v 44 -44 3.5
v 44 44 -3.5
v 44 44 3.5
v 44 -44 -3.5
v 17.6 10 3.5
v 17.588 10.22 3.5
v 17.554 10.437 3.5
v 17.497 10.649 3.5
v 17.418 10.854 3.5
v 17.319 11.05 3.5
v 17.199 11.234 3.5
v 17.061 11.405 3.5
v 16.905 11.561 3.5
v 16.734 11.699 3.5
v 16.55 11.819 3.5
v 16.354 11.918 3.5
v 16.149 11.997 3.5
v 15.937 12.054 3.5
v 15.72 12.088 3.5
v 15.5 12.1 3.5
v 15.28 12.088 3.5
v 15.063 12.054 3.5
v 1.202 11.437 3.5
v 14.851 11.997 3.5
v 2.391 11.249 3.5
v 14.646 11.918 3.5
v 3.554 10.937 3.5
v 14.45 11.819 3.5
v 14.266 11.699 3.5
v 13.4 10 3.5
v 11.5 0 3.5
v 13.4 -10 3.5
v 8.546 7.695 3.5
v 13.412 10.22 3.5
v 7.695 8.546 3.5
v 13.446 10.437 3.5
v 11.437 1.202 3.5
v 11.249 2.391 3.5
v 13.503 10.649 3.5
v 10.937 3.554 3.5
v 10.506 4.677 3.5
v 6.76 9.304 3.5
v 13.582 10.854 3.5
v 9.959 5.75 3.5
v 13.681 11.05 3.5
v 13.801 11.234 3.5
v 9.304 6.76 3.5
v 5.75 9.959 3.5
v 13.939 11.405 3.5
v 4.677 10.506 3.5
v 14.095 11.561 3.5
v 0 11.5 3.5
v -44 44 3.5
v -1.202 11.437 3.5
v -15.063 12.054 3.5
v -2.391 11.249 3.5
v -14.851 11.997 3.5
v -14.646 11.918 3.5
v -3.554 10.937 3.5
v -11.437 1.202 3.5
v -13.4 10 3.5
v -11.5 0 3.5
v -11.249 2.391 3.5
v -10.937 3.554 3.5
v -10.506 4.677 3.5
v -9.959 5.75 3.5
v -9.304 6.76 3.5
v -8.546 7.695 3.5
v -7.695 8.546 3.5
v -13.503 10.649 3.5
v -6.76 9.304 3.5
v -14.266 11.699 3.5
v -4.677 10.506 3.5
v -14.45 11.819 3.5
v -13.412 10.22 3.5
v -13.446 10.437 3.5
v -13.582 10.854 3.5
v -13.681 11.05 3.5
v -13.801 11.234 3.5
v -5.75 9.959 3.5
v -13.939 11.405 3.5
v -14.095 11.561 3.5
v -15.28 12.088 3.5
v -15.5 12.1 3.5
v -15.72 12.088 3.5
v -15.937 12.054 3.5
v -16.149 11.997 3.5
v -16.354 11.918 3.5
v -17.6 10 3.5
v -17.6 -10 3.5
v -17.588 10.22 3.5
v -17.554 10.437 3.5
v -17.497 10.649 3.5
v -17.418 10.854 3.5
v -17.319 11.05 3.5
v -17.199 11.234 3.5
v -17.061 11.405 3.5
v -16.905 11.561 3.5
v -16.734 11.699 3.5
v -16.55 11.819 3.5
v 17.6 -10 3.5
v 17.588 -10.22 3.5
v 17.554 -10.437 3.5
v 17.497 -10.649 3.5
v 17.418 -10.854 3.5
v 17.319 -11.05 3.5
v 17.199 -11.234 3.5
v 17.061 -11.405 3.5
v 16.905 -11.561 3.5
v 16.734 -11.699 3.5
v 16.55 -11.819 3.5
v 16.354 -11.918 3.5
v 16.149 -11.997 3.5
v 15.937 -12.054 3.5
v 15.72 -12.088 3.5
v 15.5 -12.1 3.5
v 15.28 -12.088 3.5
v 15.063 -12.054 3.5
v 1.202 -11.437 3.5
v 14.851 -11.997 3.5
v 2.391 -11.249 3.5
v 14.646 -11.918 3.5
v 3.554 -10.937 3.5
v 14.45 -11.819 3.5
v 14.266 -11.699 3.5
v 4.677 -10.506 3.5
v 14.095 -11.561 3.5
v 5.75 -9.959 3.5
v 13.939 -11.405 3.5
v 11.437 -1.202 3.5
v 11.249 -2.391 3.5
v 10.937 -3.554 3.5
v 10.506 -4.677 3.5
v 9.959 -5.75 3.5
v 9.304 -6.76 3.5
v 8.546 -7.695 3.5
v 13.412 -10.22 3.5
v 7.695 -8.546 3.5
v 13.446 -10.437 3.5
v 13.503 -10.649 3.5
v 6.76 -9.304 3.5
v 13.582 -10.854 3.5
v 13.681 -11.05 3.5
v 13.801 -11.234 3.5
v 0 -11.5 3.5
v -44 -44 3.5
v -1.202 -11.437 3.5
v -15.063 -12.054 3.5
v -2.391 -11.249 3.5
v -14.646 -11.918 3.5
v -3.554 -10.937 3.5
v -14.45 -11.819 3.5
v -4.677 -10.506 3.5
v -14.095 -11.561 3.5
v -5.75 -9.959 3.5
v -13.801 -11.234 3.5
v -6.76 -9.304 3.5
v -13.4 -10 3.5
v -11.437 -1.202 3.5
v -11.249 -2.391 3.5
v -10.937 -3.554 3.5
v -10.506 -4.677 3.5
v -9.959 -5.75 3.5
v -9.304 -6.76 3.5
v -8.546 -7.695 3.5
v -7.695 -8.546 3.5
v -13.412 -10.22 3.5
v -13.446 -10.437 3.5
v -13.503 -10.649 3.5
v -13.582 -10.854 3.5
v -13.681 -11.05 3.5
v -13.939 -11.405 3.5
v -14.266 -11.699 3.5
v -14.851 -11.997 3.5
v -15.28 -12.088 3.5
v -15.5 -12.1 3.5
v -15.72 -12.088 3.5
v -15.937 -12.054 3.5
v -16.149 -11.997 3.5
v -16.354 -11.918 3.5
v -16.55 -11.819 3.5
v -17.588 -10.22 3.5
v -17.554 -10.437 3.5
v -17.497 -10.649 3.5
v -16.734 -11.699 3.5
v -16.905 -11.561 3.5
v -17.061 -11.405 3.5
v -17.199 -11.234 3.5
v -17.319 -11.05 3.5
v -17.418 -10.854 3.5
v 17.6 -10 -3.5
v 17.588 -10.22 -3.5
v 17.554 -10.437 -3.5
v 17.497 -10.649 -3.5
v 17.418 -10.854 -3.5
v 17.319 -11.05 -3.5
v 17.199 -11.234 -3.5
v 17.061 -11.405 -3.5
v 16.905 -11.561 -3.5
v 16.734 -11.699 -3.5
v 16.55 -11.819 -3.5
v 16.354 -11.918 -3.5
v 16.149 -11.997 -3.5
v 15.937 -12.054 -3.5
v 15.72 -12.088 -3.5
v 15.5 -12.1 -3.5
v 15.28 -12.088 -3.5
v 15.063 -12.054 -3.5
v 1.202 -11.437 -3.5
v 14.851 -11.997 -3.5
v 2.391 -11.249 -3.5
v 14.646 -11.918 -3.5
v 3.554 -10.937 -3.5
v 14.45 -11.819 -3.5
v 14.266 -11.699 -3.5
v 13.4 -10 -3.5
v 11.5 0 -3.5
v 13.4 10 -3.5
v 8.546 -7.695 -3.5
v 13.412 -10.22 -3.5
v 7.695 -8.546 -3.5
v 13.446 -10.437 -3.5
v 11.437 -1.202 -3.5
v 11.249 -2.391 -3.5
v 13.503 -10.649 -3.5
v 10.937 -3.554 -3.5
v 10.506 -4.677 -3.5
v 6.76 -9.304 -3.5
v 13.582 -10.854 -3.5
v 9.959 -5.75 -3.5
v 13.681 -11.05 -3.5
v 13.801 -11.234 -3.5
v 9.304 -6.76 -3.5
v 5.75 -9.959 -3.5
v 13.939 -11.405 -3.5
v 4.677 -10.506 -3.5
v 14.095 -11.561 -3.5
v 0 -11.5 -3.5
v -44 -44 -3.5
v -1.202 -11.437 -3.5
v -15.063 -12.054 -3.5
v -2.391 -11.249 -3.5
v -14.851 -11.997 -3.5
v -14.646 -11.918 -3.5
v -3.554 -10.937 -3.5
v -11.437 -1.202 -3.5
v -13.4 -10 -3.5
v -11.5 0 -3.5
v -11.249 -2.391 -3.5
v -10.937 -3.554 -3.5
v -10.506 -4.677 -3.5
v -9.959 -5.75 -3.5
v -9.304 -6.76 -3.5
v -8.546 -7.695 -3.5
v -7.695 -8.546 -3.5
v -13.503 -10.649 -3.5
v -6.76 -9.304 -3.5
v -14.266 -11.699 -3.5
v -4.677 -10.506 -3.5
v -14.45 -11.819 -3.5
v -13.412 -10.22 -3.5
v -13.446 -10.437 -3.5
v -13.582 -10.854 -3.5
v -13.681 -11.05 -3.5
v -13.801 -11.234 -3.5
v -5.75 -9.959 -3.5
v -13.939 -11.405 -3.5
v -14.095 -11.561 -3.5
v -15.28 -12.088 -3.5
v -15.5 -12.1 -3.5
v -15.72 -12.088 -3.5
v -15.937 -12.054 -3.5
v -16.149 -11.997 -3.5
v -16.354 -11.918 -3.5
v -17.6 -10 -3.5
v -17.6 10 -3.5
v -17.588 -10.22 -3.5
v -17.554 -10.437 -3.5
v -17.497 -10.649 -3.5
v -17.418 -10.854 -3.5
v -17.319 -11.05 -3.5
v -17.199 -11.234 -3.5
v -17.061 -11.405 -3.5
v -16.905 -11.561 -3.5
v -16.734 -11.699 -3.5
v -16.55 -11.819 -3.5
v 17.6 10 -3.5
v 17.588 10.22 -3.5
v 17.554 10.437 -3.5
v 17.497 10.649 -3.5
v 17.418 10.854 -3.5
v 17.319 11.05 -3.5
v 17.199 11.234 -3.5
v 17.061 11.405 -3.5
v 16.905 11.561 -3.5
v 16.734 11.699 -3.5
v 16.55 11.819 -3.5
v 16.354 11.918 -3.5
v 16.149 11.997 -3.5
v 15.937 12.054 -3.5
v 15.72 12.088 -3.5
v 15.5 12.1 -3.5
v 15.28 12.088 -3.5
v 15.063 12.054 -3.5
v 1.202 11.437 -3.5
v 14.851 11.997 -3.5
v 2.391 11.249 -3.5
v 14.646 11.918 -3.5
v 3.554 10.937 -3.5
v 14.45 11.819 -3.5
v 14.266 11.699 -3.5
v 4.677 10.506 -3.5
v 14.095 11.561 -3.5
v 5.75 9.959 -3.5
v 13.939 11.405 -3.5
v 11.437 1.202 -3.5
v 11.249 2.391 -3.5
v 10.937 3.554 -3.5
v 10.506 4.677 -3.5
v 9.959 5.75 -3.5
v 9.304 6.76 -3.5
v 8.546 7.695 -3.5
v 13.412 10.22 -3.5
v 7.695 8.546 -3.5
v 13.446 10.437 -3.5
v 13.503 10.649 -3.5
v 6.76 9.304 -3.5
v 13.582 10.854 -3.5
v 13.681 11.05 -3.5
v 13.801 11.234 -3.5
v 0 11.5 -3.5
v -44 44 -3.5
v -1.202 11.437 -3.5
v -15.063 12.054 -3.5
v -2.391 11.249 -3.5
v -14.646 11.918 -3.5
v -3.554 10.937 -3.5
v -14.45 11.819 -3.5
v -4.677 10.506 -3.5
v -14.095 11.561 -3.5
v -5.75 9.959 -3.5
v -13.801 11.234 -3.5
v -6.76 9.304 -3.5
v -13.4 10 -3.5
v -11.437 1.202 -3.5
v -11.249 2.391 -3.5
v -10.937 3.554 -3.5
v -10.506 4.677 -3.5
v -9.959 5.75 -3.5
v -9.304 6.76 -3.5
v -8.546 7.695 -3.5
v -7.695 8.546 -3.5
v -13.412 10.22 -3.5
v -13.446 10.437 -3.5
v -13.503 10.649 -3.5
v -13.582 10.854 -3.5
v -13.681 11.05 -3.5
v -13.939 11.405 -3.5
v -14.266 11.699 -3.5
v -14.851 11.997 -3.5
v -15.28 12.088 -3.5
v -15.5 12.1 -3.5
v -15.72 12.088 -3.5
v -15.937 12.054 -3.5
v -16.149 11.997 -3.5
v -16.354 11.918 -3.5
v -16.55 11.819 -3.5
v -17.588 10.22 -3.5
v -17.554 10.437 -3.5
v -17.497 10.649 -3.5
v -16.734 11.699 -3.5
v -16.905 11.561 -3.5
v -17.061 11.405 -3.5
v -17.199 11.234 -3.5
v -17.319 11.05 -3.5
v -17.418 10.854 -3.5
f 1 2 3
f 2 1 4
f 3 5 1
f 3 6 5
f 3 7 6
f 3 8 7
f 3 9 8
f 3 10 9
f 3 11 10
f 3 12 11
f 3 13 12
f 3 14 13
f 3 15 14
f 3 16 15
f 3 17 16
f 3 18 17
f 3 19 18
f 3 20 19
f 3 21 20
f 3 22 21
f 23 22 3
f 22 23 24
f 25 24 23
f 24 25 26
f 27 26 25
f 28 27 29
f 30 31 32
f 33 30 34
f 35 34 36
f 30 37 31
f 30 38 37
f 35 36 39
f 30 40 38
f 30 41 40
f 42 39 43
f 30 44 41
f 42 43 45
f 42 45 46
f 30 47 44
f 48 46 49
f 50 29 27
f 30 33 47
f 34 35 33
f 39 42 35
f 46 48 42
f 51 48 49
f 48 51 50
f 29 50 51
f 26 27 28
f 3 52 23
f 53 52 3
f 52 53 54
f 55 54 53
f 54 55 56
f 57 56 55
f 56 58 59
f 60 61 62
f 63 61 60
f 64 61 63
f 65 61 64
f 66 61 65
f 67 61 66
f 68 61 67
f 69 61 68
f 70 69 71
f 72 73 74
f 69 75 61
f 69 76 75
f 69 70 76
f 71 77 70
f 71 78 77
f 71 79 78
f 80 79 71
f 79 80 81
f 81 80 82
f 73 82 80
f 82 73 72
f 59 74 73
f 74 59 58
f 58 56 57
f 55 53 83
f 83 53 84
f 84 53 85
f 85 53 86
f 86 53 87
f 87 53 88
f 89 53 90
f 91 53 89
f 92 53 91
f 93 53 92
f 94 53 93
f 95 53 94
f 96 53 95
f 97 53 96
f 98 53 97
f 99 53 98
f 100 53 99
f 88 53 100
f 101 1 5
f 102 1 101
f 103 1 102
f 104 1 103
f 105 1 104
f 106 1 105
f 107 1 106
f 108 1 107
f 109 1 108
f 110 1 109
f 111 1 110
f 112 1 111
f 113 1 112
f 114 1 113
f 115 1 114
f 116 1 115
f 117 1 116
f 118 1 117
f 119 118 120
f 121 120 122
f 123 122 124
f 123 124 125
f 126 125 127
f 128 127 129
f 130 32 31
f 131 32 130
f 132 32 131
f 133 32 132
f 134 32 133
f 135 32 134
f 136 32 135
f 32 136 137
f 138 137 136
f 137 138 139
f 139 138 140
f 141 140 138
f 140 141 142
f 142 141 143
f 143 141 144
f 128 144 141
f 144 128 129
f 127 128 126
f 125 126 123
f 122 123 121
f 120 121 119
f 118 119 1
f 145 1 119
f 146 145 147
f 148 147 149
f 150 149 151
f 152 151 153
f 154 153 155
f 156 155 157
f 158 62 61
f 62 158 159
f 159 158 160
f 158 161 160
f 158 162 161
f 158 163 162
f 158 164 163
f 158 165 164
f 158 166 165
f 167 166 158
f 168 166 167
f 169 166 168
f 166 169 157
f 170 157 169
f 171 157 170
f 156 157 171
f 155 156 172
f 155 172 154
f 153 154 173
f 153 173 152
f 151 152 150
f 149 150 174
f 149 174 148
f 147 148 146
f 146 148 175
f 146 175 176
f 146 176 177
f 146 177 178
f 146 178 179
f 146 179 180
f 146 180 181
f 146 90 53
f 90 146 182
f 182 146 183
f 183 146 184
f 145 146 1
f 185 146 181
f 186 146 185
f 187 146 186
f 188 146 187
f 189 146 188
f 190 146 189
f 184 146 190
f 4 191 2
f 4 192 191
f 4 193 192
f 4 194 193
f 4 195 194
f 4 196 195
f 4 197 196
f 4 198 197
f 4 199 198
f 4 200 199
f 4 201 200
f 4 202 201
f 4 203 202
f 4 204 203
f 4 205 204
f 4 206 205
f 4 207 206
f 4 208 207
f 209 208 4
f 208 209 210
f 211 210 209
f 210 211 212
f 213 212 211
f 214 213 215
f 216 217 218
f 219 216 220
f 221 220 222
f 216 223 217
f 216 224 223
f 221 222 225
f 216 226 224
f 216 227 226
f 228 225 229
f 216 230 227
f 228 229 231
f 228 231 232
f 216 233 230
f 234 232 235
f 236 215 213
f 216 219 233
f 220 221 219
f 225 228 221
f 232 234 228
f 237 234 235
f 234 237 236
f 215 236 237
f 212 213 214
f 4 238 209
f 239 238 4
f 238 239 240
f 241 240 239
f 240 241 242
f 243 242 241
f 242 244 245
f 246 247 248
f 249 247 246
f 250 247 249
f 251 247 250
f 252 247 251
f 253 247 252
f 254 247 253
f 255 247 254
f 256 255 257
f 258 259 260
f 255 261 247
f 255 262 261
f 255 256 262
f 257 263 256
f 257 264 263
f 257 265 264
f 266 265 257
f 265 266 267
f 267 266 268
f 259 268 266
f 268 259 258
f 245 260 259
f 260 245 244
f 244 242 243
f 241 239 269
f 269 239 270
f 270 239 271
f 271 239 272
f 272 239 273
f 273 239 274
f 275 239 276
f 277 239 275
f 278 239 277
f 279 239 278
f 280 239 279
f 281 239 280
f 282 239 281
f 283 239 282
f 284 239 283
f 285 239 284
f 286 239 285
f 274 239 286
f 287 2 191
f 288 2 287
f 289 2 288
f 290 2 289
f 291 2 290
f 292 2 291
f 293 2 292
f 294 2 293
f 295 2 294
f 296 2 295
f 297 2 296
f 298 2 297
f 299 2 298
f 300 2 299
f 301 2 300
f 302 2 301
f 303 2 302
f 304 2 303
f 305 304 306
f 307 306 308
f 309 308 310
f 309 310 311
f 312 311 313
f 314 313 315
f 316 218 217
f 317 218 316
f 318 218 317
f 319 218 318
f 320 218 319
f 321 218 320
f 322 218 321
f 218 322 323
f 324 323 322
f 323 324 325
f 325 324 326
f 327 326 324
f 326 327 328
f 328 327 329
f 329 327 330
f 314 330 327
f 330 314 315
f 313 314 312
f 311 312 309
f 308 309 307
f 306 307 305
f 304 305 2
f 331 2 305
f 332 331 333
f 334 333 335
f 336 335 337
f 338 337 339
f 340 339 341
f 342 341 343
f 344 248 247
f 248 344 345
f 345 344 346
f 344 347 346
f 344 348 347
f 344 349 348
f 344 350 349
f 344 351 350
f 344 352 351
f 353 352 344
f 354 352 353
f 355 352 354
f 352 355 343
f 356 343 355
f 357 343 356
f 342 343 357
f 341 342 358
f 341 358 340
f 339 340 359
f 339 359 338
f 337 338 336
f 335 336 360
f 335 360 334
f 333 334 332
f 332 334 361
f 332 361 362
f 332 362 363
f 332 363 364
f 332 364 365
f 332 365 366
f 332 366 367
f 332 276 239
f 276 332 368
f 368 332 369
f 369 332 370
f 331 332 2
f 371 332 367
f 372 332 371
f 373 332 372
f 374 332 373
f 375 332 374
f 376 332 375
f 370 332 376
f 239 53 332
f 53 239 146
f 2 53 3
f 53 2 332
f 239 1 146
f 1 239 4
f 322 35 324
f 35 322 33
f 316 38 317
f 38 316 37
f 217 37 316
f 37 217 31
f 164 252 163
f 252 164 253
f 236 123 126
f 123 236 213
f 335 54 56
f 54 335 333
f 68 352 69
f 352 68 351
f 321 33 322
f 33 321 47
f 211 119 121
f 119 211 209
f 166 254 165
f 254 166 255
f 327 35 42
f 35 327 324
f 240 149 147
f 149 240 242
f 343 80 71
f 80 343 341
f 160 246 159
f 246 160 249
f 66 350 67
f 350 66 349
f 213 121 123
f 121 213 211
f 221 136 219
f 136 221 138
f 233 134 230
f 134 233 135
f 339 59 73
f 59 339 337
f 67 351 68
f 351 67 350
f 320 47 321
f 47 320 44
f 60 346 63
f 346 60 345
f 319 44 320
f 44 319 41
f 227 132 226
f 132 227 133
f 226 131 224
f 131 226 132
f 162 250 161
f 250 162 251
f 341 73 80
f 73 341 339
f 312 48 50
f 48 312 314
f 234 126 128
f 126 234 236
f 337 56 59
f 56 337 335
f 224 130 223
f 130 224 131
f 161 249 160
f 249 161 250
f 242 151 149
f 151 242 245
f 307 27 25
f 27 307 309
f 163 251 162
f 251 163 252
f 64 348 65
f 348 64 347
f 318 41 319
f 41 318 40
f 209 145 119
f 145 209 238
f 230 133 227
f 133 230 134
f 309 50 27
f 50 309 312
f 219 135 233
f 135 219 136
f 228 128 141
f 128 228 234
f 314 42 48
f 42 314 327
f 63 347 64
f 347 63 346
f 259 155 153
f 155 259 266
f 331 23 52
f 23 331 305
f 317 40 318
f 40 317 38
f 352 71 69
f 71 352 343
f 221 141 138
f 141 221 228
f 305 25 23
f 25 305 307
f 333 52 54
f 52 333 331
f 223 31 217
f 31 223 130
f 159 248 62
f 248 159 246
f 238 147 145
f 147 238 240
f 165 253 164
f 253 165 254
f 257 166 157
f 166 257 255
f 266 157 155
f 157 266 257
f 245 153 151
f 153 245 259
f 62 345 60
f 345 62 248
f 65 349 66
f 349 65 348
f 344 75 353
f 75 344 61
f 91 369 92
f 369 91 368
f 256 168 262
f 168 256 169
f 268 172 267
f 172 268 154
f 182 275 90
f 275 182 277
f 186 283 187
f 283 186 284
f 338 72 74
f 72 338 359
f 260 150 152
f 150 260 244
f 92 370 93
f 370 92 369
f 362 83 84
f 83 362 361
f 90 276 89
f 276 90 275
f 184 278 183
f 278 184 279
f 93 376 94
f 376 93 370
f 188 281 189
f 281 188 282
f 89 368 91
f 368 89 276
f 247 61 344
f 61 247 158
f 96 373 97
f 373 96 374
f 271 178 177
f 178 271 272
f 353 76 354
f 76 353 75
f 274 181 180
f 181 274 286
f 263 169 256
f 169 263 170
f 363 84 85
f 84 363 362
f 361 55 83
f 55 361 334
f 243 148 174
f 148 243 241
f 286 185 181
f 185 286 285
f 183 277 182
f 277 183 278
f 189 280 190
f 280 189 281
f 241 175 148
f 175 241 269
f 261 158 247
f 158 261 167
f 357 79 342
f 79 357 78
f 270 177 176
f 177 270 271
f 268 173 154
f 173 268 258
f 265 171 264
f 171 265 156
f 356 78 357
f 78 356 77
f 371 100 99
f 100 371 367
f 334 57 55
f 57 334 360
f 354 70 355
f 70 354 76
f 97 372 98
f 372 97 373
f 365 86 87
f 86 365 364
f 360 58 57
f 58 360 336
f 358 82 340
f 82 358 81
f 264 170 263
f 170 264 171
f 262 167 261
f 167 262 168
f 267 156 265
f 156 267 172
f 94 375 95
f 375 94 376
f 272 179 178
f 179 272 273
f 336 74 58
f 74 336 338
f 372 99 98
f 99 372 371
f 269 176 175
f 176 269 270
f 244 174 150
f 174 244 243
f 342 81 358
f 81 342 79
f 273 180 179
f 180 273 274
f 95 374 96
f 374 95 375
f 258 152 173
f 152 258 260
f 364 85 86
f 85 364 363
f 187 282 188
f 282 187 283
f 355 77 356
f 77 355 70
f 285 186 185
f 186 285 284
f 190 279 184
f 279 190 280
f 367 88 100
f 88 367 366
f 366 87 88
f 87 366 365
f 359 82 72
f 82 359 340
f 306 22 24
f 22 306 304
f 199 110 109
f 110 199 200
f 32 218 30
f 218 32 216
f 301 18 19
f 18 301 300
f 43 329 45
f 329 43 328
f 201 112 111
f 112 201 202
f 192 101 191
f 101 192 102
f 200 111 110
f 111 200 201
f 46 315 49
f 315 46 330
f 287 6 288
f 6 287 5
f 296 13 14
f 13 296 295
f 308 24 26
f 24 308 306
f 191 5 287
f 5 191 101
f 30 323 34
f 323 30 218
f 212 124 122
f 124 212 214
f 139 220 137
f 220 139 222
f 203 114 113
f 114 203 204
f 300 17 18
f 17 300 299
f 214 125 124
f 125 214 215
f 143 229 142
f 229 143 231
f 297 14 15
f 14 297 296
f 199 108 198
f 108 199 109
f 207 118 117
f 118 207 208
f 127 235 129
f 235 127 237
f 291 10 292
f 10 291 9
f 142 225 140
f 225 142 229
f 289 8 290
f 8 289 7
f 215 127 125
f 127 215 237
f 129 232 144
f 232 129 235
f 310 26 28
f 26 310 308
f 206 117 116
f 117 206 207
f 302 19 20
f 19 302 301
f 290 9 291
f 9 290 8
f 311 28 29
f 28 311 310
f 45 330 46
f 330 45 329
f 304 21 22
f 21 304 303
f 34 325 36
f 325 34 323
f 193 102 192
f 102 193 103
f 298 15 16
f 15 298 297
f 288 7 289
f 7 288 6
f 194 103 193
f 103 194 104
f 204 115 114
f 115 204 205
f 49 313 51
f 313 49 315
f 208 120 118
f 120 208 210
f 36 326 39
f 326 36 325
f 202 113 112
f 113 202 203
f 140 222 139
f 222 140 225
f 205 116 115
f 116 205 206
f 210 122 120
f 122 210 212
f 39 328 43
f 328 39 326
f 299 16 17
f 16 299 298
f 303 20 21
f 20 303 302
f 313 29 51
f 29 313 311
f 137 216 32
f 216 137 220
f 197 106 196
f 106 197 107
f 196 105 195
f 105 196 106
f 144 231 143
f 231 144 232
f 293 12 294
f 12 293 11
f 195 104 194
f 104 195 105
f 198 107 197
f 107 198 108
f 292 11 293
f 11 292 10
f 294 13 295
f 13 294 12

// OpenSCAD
// NEMA 17 adjustable motor plate, 88 mm square.
$fn = 60;
eps = 0.02;
plate = 88;
plate_t = 7;
hole_pitch = 31;
center_d = 23;
slot_l = 20;
slot_d = 4.2;
module slot(x) {
    hull() {
        translate([x, -slot_l / 2, -plate_t / 2 - eps]) cylinder(d = slot_d, h = plate_t + 2 * eps);
        translate([x, slot_l / 2, -plate_t / 2 - eps]) cylinder(d = slot_d, h = plate_t + 2 * eps);
    }
}
difference() {
    cube([plate, plate, plate_t], center = true);
    translate([0, 0, -plate_t / 2 - eps]) cylinder(d = center_d, h = plate_t + 2 * eps);
    slot(-hole_pitch / 2);
    slot(hole_pitch / 2);
}
